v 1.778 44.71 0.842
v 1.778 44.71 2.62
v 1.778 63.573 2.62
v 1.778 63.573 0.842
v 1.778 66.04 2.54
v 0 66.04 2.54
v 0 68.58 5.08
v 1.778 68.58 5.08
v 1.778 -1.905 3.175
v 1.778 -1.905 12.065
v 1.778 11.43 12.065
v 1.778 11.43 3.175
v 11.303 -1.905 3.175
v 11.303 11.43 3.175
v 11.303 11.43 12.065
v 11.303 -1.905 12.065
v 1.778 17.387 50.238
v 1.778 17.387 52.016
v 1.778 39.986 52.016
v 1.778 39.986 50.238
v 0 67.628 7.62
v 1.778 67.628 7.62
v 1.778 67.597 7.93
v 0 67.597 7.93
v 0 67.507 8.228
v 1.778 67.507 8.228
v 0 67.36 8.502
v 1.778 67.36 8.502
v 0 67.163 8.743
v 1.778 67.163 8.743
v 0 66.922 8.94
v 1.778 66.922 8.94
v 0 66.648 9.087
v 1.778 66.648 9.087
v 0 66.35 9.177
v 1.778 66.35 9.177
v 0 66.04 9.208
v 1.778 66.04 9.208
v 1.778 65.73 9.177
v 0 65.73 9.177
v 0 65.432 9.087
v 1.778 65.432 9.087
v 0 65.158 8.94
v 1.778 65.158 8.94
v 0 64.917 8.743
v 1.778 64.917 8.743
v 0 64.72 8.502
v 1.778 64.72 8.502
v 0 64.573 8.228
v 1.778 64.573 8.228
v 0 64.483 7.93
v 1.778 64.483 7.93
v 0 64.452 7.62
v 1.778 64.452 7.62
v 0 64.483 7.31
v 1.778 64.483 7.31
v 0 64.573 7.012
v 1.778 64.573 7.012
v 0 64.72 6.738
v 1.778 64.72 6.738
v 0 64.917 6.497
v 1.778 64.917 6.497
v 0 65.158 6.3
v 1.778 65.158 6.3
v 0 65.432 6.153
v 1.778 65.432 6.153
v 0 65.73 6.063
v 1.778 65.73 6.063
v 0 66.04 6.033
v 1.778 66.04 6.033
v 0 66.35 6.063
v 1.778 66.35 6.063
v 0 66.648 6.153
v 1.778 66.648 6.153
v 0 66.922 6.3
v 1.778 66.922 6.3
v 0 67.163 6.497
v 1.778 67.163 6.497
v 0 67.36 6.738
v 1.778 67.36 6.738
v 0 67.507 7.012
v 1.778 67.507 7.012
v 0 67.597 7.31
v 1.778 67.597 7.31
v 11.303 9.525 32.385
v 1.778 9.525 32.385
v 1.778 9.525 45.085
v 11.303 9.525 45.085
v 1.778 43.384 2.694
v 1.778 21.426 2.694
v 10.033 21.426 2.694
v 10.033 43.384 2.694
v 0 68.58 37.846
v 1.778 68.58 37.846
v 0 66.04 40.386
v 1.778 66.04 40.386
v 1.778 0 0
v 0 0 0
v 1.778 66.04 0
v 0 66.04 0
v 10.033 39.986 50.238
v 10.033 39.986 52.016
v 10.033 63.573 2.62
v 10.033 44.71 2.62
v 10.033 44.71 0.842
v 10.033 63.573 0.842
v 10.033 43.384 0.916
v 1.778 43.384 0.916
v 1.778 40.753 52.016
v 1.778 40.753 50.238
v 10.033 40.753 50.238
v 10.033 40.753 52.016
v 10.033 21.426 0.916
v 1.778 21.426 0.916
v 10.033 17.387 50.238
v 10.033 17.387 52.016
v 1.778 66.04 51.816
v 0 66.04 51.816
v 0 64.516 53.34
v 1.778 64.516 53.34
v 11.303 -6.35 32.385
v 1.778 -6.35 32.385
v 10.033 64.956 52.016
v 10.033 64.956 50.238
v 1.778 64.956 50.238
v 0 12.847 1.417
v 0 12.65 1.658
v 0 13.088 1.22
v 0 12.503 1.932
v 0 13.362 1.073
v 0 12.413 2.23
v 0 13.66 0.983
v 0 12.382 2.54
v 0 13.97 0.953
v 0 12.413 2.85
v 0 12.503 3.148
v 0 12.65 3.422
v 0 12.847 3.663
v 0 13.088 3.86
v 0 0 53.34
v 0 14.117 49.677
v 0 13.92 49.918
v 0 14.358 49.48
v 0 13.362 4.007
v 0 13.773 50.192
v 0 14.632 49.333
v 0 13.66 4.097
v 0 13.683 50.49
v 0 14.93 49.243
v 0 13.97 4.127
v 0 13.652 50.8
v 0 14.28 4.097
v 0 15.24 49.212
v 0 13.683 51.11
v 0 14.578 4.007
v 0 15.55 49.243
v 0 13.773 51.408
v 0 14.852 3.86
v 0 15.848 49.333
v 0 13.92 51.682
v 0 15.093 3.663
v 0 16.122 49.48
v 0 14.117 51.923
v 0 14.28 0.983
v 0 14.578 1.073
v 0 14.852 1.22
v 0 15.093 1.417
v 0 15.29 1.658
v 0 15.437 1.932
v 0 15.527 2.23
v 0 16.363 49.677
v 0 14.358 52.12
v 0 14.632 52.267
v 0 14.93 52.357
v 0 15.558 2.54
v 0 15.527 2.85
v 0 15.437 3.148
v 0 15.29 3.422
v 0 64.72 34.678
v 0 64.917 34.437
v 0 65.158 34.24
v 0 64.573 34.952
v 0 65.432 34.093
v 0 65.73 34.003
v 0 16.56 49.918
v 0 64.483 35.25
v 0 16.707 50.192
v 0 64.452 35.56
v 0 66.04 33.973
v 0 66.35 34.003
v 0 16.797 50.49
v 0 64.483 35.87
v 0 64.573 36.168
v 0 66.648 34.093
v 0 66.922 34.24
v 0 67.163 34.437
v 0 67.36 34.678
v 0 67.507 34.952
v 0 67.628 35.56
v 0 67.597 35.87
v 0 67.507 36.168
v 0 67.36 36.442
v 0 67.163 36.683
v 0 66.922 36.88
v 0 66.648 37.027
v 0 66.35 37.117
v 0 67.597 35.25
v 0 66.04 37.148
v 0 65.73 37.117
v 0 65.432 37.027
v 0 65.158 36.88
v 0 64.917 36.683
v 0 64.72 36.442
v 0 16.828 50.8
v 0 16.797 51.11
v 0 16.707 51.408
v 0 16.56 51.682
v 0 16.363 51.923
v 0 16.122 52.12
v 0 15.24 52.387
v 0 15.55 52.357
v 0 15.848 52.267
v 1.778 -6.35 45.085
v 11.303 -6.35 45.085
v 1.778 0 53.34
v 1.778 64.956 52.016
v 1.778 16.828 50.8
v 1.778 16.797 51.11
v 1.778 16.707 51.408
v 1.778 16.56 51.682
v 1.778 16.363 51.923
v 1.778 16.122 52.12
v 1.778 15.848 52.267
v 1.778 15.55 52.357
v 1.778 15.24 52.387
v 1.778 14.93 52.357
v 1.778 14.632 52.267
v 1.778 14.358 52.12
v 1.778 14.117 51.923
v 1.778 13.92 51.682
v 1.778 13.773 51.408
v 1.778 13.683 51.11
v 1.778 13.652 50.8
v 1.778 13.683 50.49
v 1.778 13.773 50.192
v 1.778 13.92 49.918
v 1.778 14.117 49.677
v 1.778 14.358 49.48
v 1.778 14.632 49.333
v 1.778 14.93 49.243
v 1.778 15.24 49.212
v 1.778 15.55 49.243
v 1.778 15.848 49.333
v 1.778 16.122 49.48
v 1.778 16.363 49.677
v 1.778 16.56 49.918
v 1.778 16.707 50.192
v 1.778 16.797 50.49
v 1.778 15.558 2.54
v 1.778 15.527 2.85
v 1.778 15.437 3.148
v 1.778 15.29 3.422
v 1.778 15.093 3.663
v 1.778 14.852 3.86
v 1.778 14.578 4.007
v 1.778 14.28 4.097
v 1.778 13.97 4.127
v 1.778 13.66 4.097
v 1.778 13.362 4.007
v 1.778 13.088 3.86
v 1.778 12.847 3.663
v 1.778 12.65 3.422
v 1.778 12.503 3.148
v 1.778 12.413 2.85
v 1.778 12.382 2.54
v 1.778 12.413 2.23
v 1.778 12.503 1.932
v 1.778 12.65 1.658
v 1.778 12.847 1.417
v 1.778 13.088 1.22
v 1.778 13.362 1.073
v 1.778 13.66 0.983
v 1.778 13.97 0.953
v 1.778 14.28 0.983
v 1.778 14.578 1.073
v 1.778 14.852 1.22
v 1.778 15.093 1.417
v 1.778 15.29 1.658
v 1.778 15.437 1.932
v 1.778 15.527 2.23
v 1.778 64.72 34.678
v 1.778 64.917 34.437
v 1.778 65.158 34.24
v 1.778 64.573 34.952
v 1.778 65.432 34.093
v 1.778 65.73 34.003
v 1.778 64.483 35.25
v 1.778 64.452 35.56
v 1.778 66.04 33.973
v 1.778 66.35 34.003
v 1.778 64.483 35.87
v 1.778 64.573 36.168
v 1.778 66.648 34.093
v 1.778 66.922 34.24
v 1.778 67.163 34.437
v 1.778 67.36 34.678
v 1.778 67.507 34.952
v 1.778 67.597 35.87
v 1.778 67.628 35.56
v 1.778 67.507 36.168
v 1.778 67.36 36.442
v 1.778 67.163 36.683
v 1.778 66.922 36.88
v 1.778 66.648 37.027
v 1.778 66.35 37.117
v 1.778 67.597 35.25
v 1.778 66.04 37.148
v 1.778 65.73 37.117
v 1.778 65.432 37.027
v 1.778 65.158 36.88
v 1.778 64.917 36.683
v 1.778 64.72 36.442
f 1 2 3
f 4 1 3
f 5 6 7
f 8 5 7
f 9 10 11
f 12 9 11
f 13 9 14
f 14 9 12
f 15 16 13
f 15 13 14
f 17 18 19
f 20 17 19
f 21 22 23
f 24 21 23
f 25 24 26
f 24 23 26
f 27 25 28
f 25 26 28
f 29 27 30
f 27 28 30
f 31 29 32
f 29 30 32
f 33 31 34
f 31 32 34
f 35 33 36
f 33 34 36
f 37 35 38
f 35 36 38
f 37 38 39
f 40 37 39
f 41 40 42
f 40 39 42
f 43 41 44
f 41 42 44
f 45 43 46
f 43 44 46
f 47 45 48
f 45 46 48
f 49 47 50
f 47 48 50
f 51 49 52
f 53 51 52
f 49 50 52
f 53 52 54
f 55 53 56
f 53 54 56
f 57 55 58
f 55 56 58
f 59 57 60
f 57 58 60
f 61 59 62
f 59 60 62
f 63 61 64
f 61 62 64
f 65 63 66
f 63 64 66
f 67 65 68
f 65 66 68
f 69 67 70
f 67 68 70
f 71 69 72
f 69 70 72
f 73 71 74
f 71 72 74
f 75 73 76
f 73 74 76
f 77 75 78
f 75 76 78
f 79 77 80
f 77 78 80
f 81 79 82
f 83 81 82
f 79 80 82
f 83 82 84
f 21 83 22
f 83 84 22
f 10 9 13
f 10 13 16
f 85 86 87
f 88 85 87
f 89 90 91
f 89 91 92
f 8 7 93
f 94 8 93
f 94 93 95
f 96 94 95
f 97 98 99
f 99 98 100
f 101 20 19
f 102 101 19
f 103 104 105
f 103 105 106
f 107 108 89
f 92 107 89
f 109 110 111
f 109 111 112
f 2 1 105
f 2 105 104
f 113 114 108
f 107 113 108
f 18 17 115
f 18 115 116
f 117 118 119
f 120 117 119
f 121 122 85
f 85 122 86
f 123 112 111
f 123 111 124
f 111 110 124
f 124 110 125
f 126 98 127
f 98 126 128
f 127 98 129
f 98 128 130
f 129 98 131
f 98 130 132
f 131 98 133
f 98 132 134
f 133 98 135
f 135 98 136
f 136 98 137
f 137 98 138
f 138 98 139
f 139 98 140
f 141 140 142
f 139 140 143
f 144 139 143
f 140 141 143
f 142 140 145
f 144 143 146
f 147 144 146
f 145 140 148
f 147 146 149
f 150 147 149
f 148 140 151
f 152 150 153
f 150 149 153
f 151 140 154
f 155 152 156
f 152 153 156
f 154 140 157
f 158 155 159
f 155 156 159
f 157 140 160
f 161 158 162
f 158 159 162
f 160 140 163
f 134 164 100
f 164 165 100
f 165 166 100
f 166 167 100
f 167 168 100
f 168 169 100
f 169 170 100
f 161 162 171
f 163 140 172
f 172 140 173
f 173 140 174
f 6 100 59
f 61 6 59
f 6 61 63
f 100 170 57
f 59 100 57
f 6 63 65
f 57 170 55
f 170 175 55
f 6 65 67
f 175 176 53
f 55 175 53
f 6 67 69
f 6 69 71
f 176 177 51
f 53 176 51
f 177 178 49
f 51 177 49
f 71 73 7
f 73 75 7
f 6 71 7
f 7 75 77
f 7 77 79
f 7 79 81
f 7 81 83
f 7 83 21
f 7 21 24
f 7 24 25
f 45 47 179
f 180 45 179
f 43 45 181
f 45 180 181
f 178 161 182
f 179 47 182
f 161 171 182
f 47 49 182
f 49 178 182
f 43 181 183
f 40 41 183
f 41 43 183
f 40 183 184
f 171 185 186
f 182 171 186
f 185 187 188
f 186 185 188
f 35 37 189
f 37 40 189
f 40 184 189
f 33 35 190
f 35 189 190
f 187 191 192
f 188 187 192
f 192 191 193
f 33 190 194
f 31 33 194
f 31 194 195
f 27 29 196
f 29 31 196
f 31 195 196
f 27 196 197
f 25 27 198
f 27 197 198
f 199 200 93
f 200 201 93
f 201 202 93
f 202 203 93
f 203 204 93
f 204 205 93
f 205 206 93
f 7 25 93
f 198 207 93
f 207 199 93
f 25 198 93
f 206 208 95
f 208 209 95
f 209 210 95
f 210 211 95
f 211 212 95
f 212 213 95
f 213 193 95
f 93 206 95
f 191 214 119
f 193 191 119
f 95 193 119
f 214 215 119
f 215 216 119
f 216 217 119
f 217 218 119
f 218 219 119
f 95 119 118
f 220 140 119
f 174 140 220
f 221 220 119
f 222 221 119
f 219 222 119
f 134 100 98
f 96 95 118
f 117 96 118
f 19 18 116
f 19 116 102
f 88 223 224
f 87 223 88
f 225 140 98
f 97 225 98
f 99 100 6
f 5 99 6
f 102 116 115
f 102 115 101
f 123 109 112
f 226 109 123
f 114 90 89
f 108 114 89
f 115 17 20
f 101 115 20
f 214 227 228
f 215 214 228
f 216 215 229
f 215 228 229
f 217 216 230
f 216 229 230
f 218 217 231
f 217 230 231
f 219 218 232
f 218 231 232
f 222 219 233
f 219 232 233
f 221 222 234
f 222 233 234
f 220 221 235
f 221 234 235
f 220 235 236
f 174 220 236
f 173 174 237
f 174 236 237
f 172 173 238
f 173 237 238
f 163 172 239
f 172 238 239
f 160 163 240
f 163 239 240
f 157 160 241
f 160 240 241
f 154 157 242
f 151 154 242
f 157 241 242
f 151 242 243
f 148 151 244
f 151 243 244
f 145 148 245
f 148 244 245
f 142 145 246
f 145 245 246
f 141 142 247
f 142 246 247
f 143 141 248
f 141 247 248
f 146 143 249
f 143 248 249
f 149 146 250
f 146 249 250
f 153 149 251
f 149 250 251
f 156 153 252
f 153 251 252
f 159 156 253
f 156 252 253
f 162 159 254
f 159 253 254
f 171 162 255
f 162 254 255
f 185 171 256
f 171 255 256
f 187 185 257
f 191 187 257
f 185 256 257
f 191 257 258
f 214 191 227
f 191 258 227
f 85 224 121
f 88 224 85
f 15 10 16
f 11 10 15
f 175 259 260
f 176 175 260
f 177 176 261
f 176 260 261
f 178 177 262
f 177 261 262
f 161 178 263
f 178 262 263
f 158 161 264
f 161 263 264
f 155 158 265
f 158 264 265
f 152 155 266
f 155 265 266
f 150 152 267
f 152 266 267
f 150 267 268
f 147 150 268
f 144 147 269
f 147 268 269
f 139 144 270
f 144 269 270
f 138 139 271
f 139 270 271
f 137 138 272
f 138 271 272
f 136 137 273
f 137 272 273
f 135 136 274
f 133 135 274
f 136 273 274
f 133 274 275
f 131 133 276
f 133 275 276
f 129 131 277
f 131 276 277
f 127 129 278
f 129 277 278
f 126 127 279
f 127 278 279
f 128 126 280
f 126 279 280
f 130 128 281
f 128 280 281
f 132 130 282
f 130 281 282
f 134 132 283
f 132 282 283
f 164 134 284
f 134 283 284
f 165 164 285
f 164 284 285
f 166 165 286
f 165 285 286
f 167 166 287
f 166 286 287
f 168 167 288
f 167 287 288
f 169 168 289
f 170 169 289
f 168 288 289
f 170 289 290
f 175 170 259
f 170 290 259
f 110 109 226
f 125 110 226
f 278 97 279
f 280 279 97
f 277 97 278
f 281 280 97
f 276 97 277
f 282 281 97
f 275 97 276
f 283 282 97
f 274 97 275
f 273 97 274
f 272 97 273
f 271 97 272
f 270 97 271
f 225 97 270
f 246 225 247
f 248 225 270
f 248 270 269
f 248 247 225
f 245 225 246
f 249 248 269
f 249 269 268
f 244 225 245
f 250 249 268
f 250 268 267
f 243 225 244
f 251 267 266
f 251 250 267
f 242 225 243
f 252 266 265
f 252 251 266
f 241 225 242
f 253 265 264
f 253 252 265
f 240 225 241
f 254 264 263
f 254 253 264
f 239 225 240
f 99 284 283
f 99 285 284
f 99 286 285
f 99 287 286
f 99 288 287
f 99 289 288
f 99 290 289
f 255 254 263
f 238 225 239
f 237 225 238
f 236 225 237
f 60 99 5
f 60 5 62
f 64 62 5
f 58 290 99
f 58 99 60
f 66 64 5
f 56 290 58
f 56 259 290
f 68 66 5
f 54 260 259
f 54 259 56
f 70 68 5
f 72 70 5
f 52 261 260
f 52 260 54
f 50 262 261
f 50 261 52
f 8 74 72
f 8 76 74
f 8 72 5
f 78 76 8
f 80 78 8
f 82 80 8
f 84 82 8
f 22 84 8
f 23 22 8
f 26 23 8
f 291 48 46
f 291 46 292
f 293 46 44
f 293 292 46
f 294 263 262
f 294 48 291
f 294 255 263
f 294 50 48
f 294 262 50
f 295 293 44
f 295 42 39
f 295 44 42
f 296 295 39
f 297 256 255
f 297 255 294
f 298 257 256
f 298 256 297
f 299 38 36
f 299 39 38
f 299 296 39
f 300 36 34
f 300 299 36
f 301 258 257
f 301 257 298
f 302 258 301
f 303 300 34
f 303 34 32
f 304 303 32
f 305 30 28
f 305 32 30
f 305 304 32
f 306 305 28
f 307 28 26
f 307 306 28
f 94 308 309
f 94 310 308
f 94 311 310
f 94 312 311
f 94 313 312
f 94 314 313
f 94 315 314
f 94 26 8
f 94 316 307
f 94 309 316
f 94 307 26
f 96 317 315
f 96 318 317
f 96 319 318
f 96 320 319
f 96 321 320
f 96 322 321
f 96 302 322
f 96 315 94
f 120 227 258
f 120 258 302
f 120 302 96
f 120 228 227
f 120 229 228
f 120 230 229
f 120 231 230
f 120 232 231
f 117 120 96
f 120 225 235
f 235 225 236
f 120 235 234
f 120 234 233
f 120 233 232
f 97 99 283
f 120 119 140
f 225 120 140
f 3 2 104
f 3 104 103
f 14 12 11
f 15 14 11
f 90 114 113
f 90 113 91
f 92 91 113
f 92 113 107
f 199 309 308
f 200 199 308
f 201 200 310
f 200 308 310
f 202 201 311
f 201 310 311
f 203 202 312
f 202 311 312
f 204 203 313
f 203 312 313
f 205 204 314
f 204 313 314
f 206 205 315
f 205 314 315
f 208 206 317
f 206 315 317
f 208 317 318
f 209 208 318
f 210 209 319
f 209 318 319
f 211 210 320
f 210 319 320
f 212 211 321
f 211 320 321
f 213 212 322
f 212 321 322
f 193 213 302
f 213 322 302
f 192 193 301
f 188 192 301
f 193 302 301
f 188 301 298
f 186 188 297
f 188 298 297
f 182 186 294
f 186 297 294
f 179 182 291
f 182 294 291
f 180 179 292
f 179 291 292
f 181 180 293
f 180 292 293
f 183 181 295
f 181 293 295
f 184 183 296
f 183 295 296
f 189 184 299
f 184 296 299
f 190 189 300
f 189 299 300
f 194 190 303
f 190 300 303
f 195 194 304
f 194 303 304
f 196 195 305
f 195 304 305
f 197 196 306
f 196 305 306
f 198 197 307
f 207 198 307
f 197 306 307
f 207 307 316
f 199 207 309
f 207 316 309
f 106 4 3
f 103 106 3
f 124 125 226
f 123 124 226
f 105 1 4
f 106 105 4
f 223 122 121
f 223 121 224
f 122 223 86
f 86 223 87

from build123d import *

# Parameters (mm, degrees)
F1_DEPTH = 1.778
F2_R     = 1.5875
F3_DEPTH = 1.778
F4_W     = 13.335
F4_H     = 8.89
F5_DEPTH = 9.525
F4_W_2   = 15.875
F4_H_2   = 12.7
F6_W     = 22.5986149162
F6_H     = 1.778
F7_DEPTH = 8.255
F6_W_2   = 24.2028385401
F6_W_3   = 21.9575874507
F6_W_4   = 18.8628956676


# Not quite as in the source:
# - a feature of the source that left no trace in its solid (it failed there, or was rolled back) is left out


with BuildPart() as f1:
    # F0 (on Right) → F1 (new body)
    with BuildSketch(Plane.YZ):
        Polygon((64.516, 53.34), (0, 53.34), (0, 0), (66.04, 0), (66.04, 2.54), (68.58, 5.08), (68.58, 37.846), (66.04, 40.386), (66.04, 51.816), align=None)
    extrude(amount=F1_DEPTH)

    # F2 (on face) → F3 (cut)
    with BuildSketch(Plane.YZ.offset(1.778)):
        with Locations((13.97, 2.54)):
            Circle(F2_R)
        with Locations((15.24, 50.8)):
            Circle(F2_R)
        with Locations((66.04, 35.56)):
            Circle(F2_R)
        with Locations((66.04, 7.62)):
            Circle(F2_R)
    extrude(amount=-F3_DEPTH, mode=Mode.SUBTRACT)


with BuildPart() as f5:
    # F4 (on face) → F5 (new body)
    with BuildSketch(Plane.YZ.offset(1.778)):
        with Locations((4.7625, 7.62)):
            Rectangle(F4_W, F4_H)
    extrude(amount=F5_DEPTH)


with BuildPart() as f5b:
    # F4 (on face) → F5, piece 2 (new body)
    with BuildSketch(Plane.YZ.offset(1.778)):
        with Locations((1.5875, 38.735)):
            Rectangle(F4_W_2, F4_H_2)
    extrude(amount=F5_DEPTH)


with BuildPart() as f7:
    # F6 (on face) → F7 (new body)
    with BuildSketch(Plane.YZ.offset(1.778)):
        with Locations((28.6866696551, 51.1273522689)):
            Rectangle(F6_W, F6_H)
    extrude(amount=F7_DEPTH)


with BuildPart() as f7b:
    # F6 (on face) → F7, piece 2 (new body)
    with BuildSketch(Plane.YZ.offset(1.778)):
        with Locations((52.8546348214, 51.1273522689)):
            Rectangle(F6_W_2, F6_H)
    extrude(amount=F7_DEPTH)


with BuildPart() as f7c:
    # F6 (on face) → F7, piece 3 (new body)
    with BuildSketch(Plane.YZ.offset(1.778)):
        with Locations((32.4050504714, 1.8045752487)):
            Rectangle(F6_W_3, F6_H)
    extrude(amount=F7_DEPTH)


with BuildPart() as f7d:
    # F6 (on face) → F7, piece 4 (new body)
    with BuildSketch(Plane.YZ.offset(1.778)):
        with Locations((54.1415922344, 1.7308921498)):
            Rectangle(F6_W_4, F6_H)
    extrude(amount=F7_DEPTH)


solid = Compound([f1.part, f5.part, f5b.part, f7.part, f7b.part, f7c.part, f7d.part])
